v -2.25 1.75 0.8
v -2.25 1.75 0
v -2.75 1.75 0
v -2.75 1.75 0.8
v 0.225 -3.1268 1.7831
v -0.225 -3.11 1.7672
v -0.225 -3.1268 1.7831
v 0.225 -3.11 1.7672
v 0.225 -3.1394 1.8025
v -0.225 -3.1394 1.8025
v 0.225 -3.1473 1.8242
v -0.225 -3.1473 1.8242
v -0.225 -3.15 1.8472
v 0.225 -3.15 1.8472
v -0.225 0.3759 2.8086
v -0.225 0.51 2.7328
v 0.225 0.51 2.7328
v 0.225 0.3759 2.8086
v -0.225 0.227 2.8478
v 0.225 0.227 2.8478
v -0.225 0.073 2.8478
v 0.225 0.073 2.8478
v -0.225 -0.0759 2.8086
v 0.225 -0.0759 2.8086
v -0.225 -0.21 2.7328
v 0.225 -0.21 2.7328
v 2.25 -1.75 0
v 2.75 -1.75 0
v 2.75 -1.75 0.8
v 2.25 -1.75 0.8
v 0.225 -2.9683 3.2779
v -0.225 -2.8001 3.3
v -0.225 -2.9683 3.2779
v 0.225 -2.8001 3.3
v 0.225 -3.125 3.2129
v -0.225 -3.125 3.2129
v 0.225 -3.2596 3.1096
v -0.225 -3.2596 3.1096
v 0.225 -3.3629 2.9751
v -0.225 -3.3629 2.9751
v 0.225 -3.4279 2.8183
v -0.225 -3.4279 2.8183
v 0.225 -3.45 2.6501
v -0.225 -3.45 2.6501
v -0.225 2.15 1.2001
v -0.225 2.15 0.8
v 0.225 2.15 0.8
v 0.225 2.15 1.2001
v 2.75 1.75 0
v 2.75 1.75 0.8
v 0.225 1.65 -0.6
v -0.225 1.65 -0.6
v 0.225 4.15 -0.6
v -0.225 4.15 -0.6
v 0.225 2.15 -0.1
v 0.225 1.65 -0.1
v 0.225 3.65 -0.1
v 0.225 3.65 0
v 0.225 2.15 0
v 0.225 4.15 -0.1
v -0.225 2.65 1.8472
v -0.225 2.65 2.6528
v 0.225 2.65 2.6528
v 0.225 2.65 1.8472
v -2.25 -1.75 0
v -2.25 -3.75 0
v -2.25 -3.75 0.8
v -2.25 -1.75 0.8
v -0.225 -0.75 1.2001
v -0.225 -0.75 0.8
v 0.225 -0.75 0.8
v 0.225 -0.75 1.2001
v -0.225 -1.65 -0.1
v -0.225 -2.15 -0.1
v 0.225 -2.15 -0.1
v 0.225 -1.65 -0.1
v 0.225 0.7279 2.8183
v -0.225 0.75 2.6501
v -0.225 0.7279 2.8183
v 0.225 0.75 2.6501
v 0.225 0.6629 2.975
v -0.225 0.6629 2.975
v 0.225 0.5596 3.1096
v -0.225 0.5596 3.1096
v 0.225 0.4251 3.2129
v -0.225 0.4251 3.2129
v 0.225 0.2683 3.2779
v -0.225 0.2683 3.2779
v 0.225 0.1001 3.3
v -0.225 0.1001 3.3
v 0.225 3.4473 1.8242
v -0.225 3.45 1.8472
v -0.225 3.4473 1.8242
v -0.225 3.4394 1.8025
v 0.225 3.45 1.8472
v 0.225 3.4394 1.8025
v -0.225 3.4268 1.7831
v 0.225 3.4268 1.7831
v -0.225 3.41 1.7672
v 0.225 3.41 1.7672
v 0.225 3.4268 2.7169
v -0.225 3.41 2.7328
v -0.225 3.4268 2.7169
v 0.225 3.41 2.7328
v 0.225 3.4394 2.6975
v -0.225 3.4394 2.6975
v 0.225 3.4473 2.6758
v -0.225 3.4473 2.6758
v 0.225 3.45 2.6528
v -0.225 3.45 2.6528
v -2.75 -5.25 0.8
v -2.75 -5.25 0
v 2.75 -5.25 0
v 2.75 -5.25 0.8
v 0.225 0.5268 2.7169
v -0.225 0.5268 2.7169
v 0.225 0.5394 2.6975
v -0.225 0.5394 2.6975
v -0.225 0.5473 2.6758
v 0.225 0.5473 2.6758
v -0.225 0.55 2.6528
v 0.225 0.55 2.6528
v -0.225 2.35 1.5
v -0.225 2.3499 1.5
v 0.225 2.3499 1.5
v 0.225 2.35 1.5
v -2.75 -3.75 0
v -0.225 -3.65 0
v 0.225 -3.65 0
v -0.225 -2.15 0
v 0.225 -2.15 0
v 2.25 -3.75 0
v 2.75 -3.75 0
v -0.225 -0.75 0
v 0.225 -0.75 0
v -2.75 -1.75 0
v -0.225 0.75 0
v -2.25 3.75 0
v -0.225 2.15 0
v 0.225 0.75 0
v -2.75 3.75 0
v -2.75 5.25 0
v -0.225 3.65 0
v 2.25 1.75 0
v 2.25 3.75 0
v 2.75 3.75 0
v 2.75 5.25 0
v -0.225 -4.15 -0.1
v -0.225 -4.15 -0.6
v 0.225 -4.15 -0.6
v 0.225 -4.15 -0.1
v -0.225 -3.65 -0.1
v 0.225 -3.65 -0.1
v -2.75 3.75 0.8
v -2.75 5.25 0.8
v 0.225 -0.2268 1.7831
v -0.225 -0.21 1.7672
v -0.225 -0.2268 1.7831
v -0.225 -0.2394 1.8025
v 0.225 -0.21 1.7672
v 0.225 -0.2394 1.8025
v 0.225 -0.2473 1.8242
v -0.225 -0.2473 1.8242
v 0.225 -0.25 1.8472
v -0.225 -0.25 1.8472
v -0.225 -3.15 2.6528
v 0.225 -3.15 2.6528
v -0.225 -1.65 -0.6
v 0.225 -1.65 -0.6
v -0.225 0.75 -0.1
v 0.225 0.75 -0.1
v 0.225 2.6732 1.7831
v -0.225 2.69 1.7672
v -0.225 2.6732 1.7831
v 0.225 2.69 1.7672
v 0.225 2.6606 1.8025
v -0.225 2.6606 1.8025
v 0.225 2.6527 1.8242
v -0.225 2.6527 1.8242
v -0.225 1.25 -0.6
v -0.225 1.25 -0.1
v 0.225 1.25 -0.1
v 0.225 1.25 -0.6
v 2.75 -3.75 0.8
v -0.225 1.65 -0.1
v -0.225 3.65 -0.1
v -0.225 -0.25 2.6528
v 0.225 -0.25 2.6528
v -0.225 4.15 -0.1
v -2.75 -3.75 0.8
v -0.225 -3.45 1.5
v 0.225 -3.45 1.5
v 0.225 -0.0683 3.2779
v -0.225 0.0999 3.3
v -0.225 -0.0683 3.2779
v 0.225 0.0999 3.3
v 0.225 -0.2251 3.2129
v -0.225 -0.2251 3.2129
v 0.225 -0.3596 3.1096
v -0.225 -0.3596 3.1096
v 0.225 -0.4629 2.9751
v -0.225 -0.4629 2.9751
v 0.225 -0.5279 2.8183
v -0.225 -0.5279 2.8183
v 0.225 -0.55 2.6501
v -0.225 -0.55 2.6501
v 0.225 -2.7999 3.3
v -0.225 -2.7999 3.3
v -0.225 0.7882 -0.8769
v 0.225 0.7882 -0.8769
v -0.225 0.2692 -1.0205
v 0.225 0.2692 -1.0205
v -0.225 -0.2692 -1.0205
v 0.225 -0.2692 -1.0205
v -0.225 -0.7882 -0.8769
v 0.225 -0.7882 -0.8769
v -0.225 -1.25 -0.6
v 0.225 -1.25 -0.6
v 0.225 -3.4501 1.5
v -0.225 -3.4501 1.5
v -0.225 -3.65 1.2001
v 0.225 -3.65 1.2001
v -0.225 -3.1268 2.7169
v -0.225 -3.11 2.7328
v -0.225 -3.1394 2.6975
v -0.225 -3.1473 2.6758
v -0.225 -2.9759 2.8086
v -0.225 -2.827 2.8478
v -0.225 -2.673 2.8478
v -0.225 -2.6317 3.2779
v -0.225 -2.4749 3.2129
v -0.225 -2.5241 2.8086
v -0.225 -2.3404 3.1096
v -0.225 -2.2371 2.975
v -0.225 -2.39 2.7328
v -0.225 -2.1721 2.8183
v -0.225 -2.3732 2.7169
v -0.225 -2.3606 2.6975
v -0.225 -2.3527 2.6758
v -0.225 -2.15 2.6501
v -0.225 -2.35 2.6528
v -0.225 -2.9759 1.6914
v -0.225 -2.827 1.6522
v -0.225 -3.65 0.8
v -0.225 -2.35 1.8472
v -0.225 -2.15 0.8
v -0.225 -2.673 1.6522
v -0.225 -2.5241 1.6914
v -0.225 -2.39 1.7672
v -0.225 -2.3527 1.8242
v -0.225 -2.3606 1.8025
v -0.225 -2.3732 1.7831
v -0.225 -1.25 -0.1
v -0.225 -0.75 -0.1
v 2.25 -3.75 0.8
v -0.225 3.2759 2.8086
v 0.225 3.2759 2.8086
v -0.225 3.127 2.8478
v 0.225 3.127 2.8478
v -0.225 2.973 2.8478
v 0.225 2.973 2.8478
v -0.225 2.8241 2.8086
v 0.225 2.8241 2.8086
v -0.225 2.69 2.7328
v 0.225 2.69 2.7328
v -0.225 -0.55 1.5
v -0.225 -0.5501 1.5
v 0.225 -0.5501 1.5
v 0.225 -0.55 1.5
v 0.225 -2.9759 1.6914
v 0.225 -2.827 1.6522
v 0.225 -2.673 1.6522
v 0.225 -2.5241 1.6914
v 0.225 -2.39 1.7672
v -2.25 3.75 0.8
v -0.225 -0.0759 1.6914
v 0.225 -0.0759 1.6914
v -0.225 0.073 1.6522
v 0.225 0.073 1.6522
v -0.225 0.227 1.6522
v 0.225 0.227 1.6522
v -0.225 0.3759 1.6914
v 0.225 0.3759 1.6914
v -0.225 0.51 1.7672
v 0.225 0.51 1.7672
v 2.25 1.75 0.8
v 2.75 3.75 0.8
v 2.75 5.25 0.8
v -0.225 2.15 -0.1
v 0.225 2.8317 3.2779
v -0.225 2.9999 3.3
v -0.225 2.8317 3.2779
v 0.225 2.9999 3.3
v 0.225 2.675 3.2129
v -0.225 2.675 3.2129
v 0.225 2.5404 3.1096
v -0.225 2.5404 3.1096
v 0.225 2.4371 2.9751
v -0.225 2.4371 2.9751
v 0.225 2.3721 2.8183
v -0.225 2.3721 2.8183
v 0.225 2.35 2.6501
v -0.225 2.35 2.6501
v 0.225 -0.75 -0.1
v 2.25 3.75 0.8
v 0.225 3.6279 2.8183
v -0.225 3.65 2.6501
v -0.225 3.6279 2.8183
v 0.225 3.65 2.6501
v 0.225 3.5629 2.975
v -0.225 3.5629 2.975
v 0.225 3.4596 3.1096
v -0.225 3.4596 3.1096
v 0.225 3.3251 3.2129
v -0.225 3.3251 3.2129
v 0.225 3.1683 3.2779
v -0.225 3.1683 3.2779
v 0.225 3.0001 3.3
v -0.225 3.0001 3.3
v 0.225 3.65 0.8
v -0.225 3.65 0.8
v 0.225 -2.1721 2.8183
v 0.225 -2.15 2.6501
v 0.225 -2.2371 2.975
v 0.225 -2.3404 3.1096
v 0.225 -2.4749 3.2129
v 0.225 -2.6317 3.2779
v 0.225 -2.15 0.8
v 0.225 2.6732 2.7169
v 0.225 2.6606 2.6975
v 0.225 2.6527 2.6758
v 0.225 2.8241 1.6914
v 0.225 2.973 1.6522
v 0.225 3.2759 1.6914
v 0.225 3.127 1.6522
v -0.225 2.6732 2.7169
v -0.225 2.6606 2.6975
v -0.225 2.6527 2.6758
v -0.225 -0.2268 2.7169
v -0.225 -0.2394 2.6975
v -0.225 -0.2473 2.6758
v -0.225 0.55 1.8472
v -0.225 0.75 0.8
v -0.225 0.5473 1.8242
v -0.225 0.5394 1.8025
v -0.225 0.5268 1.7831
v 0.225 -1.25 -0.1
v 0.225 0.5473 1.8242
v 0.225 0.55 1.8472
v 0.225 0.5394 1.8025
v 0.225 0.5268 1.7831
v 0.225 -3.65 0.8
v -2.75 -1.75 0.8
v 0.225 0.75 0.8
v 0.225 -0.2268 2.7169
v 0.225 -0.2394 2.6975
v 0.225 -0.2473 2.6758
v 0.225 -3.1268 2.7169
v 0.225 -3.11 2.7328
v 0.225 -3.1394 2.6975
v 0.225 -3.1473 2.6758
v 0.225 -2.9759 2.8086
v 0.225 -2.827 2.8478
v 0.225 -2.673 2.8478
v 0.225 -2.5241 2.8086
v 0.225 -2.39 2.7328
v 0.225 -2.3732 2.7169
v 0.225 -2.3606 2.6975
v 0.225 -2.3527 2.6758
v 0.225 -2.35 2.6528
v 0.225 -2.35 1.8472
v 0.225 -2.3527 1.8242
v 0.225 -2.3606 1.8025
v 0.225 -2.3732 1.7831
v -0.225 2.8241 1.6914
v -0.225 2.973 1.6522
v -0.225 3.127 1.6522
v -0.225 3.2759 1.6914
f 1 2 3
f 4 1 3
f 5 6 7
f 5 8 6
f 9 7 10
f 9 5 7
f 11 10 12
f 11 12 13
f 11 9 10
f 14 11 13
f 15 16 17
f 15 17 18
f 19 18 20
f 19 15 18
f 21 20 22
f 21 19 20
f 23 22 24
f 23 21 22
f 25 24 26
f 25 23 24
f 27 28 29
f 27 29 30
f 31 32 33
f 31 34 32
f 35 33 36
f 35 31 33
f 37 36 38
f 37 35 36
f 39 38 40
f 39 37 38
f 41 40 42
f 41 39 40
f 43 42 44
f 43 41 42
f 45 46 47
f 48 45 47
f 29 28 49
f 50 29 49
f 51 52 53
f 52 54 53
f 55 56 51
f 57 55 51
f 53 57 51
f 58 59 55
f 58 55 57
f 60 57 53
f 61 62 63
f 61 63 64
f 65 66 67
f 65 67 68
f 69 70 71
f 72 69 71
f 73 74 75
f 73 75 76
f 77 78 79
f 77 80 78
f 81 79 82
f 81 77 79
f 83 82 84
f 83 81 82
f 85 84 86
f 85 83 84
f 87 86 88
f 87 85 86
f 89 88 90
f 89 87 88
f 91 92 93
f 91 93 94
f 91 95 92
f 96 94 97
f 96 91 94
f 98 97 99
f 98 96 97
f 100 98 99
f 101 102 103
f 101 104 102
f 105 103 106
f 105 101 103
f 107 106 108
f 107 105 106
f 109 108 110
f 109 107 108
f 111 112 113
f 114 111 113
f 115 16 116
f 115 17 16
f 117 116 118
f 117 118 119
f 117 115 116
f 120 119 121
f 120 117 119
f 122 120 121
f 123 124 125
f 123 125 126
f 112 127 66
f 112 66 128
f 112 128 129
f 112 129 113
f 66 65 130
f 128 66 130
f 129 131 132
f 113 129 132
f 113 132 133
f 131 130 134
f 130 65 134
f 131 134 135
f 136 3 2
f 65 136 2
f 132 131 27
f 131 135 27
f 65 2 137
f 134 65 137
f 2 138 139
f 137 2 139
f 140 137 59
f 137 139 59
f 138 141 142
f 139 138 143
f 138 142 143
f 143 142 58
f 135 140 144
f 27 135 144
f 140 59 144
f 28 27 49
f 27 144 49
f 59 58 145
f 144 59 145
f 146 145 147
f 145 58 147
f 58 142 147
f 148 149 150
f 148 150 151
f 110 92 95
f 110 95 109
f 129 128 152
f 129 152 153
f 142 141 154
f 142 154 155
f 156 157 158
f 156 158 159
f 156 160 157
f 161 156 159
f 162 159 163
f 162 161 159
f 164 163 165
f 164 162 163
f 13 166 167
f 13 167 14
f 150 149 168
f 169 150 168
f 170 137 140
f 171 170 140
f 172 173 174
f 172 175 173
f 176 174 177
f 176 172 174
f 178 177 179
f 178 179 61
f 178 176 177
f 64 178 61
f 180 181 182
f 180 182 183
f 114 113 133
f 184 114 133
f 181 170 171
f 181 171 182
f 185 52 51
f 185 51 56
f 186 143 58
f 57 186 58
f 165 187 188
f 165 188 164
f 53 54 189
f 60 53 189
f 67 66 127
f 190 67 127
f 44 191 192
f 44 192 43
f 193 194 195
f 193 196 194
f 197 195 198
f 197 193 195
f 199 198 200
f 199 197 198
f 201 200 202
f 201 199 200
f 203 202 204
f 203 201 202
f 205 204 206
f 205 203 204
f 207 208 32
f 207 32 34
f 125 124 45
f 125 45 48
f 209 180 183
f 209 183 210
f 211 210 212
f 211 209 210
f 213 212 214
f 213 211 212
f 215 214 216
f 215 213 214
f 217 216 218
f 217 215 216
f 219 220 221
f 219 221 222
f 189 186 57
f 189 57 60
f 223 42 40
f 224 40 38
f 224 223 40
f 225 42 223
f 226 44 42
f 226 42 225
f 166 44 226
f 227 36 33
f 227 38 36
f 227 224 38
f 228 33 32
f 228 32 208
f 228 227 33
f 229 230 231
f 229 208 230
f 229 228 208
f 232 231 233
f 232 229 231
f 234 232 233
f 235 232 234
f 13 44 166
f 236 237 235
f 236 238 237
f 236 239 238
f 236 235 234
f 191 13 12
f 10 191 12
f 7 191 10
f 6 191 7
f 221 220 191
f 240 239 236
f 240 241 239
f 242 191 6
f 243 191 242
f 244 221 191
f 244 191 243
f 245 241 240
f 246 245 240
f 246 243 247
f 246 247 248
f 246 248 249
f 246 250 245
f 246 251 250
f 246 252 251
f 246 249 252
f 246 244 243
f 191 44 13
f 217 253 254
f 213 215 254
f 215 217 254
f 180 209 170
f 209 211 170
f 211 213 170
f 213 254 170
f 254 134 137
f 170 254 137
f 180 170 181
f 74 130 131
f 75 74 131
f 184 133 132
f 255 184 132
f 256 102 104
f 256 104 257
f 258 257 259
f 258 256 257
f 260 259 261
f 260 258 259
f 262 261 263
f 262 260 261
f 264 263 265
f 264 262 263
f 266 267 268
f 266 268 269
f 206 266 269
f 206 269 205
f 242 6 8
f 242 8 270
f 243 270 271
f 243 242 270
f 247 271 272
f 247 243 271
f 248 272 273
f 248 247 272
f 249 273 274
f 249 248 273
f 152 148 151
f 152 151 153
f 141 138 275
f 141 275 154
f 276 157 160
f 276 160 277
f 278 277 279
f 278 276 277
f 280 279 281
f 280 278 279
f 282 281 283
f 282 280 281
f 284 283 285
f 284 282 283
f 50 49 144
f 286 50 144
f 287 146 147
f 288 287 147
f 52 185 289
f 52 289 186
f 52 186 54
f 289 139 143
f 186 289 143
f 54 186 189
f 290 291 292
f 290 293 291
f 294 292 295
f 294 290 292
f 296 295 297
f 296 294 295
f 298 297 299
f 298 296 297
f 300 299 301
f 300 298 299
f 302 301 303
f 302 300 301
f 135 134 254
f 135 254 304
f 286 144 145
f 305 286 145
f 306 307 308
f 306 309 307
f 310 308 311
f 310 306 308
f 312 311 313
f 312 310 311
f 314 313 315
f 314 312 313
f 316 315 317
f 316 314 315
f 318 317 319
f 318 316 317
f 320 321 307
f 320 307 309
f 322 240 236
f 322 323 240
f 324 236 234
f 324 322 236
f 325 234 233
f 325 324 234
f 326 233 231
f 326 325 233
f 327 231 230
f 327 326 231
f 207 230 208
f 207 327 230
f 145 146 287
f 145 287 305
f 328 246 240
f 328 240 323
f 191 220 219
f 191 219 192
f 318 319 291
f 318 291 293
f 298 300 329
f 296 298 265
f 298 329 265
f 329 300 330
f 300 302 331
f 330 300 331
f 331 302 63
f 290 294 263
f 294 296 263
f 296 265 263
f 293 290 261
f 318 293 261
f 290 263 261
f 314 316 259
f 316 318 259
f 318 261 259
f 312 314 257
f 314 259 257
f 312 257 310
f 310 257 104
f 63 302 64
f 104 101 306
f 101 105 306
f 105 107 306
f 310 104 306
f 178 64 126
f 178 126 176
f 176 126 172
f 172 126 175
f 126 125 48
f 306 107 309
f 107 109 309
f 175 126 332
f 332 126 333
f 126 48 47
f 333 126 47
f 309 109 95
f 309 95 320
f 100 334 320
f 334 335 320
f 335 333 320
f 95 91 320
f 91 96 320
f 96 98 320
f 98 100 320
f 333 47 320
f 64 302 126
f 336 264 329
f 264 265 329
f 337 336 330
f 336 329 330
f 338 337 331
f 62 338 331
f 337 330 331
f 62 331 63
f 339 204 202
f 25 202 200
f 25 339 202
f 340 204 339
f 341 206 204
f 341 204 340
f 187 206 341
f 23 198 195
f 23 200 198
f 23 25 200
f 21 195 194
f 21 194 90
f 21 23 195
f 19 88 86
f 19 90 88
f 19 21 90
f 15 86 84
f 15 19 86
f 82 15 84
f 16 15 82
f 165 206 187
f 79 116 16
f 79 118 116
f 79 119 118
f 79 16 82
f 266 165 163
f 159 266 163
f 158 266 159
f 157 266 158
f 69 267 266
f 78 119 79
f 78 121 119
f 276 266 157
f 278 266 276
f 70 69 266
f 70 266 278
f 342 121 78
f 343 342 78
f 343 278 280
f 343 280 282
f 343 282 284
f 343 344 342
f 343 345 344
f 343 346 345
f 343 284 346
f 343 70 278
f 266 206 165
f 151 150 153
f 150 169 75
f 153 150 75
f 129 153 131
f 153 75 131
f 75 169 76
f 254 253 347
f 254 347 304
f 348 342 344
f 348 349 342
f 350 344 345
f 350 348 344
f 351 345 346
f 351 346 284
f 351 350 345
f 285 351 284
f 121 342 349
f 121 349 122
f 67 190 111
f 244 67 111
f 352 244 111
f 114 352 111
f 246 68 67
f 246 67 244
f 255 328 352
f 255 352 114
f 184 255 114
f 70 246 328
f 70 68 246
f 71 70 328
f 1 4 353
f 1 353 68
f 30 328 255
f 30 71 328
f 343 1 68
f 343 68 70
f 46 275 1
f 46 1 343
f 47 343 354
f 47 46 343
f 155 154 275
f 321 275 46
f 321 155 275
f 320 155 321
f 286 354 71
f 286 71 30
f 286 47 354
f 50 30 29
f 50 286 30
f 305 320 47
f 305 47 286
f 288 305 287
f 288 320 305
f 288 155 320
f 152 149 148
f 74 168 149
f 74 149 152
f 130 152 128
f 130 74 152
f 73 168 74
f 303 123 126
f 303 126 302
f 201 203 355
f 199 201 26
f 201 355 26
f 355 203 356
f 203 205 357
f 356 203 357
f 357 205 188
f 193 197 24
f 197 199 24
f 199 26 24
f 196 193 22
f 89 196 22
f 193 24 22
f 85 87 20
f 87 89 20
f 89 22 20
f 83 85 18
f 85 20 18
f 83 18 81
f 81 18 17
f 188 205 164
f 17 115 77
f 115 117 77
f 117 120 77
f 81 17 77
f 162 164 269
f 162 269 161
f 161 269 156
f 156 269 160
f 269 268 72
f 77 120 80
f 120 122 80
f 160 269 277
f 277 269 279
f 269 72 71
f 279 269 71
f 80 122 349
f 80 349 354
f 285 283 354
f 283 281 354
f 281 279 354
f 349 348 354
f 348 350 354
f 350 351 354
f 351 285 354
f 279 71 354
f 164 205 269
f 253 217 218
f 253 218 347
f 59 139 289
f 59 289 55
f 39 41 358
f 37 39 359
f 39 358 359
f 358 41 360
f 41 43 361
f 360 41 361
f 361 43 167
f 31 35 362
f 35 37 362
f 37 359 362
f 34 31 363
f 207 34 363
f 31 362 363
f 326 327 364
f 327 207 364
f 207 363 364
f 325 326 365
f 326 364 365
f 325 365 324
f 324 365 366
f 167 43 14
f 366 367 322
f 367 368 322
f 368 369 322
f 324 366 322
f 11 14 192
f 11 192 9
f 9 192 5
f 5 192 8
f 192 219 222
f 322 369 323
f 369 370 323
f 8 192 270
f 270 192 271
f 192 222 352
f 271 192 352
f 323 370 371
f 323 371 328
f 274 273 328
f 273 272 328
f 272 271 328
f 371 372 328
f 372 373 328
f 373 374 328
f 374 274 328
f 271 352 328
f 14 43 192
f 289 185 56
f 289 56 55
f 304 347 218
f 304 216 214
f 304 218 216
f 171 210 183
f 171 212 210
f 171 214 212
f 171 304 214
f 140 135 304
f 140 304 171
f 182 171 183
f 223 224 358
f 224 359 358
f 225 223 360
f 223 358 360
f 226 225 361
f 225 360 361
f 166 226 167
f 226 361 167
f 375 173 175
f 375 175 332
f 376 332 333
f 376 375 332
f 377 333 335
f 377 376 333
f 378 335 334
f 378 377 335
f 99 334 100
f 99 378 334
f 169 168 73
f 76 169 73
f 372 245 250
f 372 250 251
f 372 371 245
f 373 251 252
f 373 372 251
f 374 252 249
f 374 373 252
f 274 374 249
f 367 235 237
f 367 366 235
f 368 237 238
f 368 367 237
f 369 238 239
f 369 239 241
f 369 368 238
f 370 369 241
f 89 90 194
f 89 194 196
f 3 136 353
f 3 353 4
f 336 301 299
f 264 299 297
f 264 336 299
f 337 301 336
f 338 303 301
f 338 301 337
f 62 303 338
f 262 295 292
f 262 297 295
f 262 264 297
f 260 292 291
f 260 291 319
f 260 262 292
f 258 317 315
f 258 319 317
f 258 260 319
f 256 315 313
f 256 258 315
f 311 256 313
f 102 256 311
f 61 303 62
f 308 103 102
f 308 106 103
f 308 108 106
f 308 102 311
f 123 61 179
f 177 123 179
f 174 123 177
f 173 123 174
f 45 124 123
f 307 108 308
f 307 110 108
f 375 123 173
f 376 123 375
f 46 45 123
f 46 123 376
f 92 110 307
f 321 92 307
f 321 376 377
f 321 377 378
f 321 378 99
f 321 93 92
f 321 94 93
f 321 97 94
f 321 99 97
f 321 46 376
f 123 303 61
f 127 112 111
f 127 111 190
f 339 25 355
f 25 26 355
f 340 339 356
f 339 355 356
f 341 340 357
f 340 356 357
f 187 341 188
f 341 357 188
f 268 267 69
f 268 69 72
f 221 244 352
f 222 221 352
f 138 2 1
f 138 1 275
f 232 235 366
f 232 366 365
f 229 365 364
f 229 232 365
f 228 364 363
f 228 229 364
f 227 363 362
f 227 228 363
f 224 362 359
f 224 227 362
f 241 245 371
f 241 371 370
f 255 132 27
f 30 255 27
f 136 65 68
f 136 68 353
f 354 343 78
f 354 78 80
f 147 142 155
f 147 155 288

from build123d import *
from OCP.BRepFilletAPI import BRepFilletAPI_MakeChamfer

# Parameters (mm, degrees)
SKETCH_1_W                     = 5.5
SKETCH_1_H                     = 10.5
EXTRUDE_1_DEPTH                = 0.8
SKETCH_2_W                     = 1
SKETCH_2_H                     = 2
CUT_EXTRUDE_1_DEPTH            = 6.980384603
SKETCH_3_W                     = 0.45
SKETCH_3_H                     = 1.5
EXTRUDE_2_DEPTH                = 2.5
SKETCH_5_W                     = 1.8
SKETCH_5_H                     = 0.2
CUT_EXTRUDE_2_DEPTH            = 7.877726732
FILLET_5_R                     = 0.65
CHAMFER_1_SIZE                 = 0.3
CHAMFER_1_SIZE_2               = 0.2
CUT_EXTRUDE_3_DEPTH            = 7.877726732
FILLET_6_R                     = 0.1
PATTERN_LINEAR_1_COUNT         = 3
PATTERN_LINEAR_1_PITCH         = 2.9
FILLET_6_OF_PATTERN_LINEAR_1_R = 0.1
SKETCH_3_2_W                   = 0.45
SKETCH_3_2_H                   = 1.5
EXTRUDE_3_DEPTH                = 1.4
SKETCH_8_W                     = 0.5
SKETCH_8_H                     = 2.5
EXTRUDE_4_DEPTH                = 0.45


with BuildPart() as part:
    # 草图1 → 凸台-拉伸1 (new body)
    with BuildSketch(Plane.XY):
        Rectangle(SKETCH_1_W, SKETCH_1_H)
    extrude(amount=EXTRUDE_1_DEPTH)

    # 草图2 → 切除-拉伸1 (cut, through all)
    with BuildSketch(Plane(origin=(0, 0, 0), x_dir=(-1, 0, 0), z_dir=(0, 0, -1))):
        with Locations((-2.75, 2.75)):
            Rectangle(SKETCH_2_W, SKETCH_2_H)
        with Locations((-2.75, -2.75)):
            Rectangle(SKETCH_2_W, SKETCH_2_H)
        with Locations((2.75, -2.75)):
            Rectangle(SKETCH_2_W, SKETCH_2_H)
        with Locations((2.75, 2.75)):
            Rectangle(SKETCH_2_W, SKETCH_2_H)
    extrude(amount=-CUT_EXTRUDE_1_DEPTH, mode=Mode.SUBTRACT)

    # 草图3 → 凸台-拉伸2 (add)
    with BuildSketch(Plane.XY.offset(0.8)):
        with Locations((0, 2.9)):
            Rectangle(SKETCH_3_W, SKETCH_3_H)
        Rectangle(SKETCH_3_W, SKETCH_3_H)
        with Locations((0, -2.9)):
            Rectangle(SKETCH_3_W, SKETCH_3_H)
    extrude(amount=EXTRUDE_2_DEPTH)

    # 草图5 → 切除-拉伸2 (cut, through all)
    with BuildSketch(Plane.ZY.offset(0.225)):
        with Locations((2.4, 2.25)):
            Rectangle(SKETCH_5_W, SKETCH_5_H)
        with Locations((2.4, -0.65)):
            Rectangle(SKETCH_5_W, SKETCH_5_H)
        with Locations((2.4, -3.55)):
            Rectangle(SKETCH_5_W, SKETCH_5_H)
    extrude(amount=-CUT_EXTRUDE_2_DEPTH, mode=Mode.SUBTRACT)

    # 圆角5
    fillet_5_edges = [part.edges().sort_by_distance(p)[0] for p in [
        (0, -3.45, 3.3),
        (0, -2.15, 3.3),
        (0, -0.55, 3.3),
        (0, 0.75, 3.3),
        (0, 2.35, 3.3),
        (0, 3.65, 3.3),
    ]]
    fillet(fillet_5_edges, radius=FILLET_5_R - 0.0001)  # a hair under: the kernel refuses the full size

    # 倒角1
    chamfer_1_edges_1 = [part.edges().sort_by_distance(p)[0] for p in [
        (0, 2.15, 1.5),
    ]]
    chamfer_1_side_1 = [part.faces().sort_by_distance(p)[0] for p in [
        (0, 2.15, 1.496),
    ]]
    chamfer_1_edges_2 = [part.edges().sort_by_distance(p)[0] for p in [
        (0, -0.75, 1.5),
    ]]
    chamfer_1_side_2 = [part.faces().sort_by_distance(p)[0] for p in [
        (0, -0.75, 1.496),
    ]]
    chamfer_1_edges_3 = [part.edges().sort_by_distance(p)[0] for p in [
        (0, -3.65, 1.5),
    ]]
    chamfer_1_side_3 = [part.faces().sort_by_distance(p)[0] for p in [
        (0, -3.65, 1.496),
    ]]
    chamfer_1 = BRepFilletAPI_MakeChamfer(part.part.solid().wrapped)
    for e in chamfer_1_edges_1:
        chamfer_1.Add(CHAMFER_1_SIZE - 0.0001, CHAMFER_1_SIZE_2 - 0.0001, e.wrapped, chamfer_1_side_1[0].wrapped)
    for e in chamfer_1_edges_2:
        chamfer_1.Add(CHAMFER_1_SIZE - 0.0001, CHAMFER_1_SIZE_2 - 0.0001, e.wrapped, chamfer_1_side_2[0].wrapped)
    for e in chamfer_1_edges_3:
        chamfer_1.Add(CHAMFER_1_SIZE - 0.0001, CHAMFER_1_SIZE_2 - 0.0001, e.wrapped, chamfer_1_side_3[0].wrapped)
    add(Compound.cast(chamfer_1.Shape()), mode=Mode.REPLACE)  # a hair under: the kernel refuses the full size

    # 草图6 → 切除-拉伸3 (cut, through all)
    with BuildSketch(Plane.ZY.offset(0.225)):
        with BuildLine():
            Line((2.7, 2.65), (1.8, 2.65))
            ThreePointArc((1.8, 2.65), (1.647213595, 3.05), (1.8, 3.45))
            Line((1.8, 3.45), (2.7, 3.45))
            ThreePointArc((2.7, 3.45), (2.852786405, 3.05), (2.7, 2.65))
        make_face()
    cut_extrude_3 = extrude(amount=-CUT_EXTRUDE_3_DEPTH, mode=Mode.SUBTRACT)

    # 圆角6
    fillet_6_edges = [part.edges().sort_by_distance(p)[0] for p in [
        (0, 2.65, 1.8),
        (0, 3.45, 1.8),
        (0, 3.45, 2.7),
        (0, 2.65, 2.7),
    ]]
    fillet(fillet_6_edges, radius=FILLET_6_R)

    # 阵列(线性)1: 切除-拉伸3 ×3
    with Locations(*[(0, -i * PATTERN_LINEAR_1_PITCH, 0) for i in range(1, PATTERN_LINEAR_1_COUNT)]):
        add(cut_extrude_3, mode=Mode.SUBTRACT)

    # 圆角6 of 阵列(线性)1
    fillet_6_of_pattern_linear_1_edges = [part.edges().sort_by_distance(p)[0] for p in [
        (0, -0.25, 1.8),
        (0, 0.55, 1.8),
        (0, 0.55, 2.7),
        (0, -0.25, 2.7),
        (0, -3.15, 1.8),
        (0, -2.35, 1.8),
        (0, -2.35, 2.7),
        (0, -3.15, 2.7),
    ]]
    fillet(fillet_6_of_pattern_linear_1_edges, radius=FILLET_6_OF_PATTERN_LINEAR_1_R)

    # 草图3<2> → 凸台-拉伸3 (add)
    with BuildSketch(Plane.XY.offset(0.8)):
        with Locations((0, 2.9)):
            Rectangle(SKETCH_3_2_W, SKETCH_3_2_H)
        Rectangle(SKETCH_3_2_W, SKETCH_3_2_H)
        with Locations((0, -2.9)):
            Rectangle(SKETCH_3_2_W, SKETCH_3_2_H)
    extrude(amount=-EXTRUDE_3_DEPTH)

    # 草图8 → 凸台-拉伸4 (add)
    with BuildSketch(Plane.ZY.offset(0.225)):
        with Locations((-0.35, -2.9)):
            Rectangle(SKETCH_8_W, SKETCH_8_H)
        with Locations((-0.35, 2.9)):
            Rectangle(SKETCH_8_W, SKETCH_8_H)
        with BuildLine():
            Line((-0.6, -1.25), (-0.1, -1.25))
            Line((-0.1, -1.25), (-0.1, 1.25))
            Line((-0.1, 1.25), (-0.6, 1.25))
            ThreePointArc((-0.6, 1.25), (-1.0387505, 0), (-0.6, -1.25))
        make_face()
    extrude(amount=-EXTRUDE_4_DEPTH)


solid = part.part
